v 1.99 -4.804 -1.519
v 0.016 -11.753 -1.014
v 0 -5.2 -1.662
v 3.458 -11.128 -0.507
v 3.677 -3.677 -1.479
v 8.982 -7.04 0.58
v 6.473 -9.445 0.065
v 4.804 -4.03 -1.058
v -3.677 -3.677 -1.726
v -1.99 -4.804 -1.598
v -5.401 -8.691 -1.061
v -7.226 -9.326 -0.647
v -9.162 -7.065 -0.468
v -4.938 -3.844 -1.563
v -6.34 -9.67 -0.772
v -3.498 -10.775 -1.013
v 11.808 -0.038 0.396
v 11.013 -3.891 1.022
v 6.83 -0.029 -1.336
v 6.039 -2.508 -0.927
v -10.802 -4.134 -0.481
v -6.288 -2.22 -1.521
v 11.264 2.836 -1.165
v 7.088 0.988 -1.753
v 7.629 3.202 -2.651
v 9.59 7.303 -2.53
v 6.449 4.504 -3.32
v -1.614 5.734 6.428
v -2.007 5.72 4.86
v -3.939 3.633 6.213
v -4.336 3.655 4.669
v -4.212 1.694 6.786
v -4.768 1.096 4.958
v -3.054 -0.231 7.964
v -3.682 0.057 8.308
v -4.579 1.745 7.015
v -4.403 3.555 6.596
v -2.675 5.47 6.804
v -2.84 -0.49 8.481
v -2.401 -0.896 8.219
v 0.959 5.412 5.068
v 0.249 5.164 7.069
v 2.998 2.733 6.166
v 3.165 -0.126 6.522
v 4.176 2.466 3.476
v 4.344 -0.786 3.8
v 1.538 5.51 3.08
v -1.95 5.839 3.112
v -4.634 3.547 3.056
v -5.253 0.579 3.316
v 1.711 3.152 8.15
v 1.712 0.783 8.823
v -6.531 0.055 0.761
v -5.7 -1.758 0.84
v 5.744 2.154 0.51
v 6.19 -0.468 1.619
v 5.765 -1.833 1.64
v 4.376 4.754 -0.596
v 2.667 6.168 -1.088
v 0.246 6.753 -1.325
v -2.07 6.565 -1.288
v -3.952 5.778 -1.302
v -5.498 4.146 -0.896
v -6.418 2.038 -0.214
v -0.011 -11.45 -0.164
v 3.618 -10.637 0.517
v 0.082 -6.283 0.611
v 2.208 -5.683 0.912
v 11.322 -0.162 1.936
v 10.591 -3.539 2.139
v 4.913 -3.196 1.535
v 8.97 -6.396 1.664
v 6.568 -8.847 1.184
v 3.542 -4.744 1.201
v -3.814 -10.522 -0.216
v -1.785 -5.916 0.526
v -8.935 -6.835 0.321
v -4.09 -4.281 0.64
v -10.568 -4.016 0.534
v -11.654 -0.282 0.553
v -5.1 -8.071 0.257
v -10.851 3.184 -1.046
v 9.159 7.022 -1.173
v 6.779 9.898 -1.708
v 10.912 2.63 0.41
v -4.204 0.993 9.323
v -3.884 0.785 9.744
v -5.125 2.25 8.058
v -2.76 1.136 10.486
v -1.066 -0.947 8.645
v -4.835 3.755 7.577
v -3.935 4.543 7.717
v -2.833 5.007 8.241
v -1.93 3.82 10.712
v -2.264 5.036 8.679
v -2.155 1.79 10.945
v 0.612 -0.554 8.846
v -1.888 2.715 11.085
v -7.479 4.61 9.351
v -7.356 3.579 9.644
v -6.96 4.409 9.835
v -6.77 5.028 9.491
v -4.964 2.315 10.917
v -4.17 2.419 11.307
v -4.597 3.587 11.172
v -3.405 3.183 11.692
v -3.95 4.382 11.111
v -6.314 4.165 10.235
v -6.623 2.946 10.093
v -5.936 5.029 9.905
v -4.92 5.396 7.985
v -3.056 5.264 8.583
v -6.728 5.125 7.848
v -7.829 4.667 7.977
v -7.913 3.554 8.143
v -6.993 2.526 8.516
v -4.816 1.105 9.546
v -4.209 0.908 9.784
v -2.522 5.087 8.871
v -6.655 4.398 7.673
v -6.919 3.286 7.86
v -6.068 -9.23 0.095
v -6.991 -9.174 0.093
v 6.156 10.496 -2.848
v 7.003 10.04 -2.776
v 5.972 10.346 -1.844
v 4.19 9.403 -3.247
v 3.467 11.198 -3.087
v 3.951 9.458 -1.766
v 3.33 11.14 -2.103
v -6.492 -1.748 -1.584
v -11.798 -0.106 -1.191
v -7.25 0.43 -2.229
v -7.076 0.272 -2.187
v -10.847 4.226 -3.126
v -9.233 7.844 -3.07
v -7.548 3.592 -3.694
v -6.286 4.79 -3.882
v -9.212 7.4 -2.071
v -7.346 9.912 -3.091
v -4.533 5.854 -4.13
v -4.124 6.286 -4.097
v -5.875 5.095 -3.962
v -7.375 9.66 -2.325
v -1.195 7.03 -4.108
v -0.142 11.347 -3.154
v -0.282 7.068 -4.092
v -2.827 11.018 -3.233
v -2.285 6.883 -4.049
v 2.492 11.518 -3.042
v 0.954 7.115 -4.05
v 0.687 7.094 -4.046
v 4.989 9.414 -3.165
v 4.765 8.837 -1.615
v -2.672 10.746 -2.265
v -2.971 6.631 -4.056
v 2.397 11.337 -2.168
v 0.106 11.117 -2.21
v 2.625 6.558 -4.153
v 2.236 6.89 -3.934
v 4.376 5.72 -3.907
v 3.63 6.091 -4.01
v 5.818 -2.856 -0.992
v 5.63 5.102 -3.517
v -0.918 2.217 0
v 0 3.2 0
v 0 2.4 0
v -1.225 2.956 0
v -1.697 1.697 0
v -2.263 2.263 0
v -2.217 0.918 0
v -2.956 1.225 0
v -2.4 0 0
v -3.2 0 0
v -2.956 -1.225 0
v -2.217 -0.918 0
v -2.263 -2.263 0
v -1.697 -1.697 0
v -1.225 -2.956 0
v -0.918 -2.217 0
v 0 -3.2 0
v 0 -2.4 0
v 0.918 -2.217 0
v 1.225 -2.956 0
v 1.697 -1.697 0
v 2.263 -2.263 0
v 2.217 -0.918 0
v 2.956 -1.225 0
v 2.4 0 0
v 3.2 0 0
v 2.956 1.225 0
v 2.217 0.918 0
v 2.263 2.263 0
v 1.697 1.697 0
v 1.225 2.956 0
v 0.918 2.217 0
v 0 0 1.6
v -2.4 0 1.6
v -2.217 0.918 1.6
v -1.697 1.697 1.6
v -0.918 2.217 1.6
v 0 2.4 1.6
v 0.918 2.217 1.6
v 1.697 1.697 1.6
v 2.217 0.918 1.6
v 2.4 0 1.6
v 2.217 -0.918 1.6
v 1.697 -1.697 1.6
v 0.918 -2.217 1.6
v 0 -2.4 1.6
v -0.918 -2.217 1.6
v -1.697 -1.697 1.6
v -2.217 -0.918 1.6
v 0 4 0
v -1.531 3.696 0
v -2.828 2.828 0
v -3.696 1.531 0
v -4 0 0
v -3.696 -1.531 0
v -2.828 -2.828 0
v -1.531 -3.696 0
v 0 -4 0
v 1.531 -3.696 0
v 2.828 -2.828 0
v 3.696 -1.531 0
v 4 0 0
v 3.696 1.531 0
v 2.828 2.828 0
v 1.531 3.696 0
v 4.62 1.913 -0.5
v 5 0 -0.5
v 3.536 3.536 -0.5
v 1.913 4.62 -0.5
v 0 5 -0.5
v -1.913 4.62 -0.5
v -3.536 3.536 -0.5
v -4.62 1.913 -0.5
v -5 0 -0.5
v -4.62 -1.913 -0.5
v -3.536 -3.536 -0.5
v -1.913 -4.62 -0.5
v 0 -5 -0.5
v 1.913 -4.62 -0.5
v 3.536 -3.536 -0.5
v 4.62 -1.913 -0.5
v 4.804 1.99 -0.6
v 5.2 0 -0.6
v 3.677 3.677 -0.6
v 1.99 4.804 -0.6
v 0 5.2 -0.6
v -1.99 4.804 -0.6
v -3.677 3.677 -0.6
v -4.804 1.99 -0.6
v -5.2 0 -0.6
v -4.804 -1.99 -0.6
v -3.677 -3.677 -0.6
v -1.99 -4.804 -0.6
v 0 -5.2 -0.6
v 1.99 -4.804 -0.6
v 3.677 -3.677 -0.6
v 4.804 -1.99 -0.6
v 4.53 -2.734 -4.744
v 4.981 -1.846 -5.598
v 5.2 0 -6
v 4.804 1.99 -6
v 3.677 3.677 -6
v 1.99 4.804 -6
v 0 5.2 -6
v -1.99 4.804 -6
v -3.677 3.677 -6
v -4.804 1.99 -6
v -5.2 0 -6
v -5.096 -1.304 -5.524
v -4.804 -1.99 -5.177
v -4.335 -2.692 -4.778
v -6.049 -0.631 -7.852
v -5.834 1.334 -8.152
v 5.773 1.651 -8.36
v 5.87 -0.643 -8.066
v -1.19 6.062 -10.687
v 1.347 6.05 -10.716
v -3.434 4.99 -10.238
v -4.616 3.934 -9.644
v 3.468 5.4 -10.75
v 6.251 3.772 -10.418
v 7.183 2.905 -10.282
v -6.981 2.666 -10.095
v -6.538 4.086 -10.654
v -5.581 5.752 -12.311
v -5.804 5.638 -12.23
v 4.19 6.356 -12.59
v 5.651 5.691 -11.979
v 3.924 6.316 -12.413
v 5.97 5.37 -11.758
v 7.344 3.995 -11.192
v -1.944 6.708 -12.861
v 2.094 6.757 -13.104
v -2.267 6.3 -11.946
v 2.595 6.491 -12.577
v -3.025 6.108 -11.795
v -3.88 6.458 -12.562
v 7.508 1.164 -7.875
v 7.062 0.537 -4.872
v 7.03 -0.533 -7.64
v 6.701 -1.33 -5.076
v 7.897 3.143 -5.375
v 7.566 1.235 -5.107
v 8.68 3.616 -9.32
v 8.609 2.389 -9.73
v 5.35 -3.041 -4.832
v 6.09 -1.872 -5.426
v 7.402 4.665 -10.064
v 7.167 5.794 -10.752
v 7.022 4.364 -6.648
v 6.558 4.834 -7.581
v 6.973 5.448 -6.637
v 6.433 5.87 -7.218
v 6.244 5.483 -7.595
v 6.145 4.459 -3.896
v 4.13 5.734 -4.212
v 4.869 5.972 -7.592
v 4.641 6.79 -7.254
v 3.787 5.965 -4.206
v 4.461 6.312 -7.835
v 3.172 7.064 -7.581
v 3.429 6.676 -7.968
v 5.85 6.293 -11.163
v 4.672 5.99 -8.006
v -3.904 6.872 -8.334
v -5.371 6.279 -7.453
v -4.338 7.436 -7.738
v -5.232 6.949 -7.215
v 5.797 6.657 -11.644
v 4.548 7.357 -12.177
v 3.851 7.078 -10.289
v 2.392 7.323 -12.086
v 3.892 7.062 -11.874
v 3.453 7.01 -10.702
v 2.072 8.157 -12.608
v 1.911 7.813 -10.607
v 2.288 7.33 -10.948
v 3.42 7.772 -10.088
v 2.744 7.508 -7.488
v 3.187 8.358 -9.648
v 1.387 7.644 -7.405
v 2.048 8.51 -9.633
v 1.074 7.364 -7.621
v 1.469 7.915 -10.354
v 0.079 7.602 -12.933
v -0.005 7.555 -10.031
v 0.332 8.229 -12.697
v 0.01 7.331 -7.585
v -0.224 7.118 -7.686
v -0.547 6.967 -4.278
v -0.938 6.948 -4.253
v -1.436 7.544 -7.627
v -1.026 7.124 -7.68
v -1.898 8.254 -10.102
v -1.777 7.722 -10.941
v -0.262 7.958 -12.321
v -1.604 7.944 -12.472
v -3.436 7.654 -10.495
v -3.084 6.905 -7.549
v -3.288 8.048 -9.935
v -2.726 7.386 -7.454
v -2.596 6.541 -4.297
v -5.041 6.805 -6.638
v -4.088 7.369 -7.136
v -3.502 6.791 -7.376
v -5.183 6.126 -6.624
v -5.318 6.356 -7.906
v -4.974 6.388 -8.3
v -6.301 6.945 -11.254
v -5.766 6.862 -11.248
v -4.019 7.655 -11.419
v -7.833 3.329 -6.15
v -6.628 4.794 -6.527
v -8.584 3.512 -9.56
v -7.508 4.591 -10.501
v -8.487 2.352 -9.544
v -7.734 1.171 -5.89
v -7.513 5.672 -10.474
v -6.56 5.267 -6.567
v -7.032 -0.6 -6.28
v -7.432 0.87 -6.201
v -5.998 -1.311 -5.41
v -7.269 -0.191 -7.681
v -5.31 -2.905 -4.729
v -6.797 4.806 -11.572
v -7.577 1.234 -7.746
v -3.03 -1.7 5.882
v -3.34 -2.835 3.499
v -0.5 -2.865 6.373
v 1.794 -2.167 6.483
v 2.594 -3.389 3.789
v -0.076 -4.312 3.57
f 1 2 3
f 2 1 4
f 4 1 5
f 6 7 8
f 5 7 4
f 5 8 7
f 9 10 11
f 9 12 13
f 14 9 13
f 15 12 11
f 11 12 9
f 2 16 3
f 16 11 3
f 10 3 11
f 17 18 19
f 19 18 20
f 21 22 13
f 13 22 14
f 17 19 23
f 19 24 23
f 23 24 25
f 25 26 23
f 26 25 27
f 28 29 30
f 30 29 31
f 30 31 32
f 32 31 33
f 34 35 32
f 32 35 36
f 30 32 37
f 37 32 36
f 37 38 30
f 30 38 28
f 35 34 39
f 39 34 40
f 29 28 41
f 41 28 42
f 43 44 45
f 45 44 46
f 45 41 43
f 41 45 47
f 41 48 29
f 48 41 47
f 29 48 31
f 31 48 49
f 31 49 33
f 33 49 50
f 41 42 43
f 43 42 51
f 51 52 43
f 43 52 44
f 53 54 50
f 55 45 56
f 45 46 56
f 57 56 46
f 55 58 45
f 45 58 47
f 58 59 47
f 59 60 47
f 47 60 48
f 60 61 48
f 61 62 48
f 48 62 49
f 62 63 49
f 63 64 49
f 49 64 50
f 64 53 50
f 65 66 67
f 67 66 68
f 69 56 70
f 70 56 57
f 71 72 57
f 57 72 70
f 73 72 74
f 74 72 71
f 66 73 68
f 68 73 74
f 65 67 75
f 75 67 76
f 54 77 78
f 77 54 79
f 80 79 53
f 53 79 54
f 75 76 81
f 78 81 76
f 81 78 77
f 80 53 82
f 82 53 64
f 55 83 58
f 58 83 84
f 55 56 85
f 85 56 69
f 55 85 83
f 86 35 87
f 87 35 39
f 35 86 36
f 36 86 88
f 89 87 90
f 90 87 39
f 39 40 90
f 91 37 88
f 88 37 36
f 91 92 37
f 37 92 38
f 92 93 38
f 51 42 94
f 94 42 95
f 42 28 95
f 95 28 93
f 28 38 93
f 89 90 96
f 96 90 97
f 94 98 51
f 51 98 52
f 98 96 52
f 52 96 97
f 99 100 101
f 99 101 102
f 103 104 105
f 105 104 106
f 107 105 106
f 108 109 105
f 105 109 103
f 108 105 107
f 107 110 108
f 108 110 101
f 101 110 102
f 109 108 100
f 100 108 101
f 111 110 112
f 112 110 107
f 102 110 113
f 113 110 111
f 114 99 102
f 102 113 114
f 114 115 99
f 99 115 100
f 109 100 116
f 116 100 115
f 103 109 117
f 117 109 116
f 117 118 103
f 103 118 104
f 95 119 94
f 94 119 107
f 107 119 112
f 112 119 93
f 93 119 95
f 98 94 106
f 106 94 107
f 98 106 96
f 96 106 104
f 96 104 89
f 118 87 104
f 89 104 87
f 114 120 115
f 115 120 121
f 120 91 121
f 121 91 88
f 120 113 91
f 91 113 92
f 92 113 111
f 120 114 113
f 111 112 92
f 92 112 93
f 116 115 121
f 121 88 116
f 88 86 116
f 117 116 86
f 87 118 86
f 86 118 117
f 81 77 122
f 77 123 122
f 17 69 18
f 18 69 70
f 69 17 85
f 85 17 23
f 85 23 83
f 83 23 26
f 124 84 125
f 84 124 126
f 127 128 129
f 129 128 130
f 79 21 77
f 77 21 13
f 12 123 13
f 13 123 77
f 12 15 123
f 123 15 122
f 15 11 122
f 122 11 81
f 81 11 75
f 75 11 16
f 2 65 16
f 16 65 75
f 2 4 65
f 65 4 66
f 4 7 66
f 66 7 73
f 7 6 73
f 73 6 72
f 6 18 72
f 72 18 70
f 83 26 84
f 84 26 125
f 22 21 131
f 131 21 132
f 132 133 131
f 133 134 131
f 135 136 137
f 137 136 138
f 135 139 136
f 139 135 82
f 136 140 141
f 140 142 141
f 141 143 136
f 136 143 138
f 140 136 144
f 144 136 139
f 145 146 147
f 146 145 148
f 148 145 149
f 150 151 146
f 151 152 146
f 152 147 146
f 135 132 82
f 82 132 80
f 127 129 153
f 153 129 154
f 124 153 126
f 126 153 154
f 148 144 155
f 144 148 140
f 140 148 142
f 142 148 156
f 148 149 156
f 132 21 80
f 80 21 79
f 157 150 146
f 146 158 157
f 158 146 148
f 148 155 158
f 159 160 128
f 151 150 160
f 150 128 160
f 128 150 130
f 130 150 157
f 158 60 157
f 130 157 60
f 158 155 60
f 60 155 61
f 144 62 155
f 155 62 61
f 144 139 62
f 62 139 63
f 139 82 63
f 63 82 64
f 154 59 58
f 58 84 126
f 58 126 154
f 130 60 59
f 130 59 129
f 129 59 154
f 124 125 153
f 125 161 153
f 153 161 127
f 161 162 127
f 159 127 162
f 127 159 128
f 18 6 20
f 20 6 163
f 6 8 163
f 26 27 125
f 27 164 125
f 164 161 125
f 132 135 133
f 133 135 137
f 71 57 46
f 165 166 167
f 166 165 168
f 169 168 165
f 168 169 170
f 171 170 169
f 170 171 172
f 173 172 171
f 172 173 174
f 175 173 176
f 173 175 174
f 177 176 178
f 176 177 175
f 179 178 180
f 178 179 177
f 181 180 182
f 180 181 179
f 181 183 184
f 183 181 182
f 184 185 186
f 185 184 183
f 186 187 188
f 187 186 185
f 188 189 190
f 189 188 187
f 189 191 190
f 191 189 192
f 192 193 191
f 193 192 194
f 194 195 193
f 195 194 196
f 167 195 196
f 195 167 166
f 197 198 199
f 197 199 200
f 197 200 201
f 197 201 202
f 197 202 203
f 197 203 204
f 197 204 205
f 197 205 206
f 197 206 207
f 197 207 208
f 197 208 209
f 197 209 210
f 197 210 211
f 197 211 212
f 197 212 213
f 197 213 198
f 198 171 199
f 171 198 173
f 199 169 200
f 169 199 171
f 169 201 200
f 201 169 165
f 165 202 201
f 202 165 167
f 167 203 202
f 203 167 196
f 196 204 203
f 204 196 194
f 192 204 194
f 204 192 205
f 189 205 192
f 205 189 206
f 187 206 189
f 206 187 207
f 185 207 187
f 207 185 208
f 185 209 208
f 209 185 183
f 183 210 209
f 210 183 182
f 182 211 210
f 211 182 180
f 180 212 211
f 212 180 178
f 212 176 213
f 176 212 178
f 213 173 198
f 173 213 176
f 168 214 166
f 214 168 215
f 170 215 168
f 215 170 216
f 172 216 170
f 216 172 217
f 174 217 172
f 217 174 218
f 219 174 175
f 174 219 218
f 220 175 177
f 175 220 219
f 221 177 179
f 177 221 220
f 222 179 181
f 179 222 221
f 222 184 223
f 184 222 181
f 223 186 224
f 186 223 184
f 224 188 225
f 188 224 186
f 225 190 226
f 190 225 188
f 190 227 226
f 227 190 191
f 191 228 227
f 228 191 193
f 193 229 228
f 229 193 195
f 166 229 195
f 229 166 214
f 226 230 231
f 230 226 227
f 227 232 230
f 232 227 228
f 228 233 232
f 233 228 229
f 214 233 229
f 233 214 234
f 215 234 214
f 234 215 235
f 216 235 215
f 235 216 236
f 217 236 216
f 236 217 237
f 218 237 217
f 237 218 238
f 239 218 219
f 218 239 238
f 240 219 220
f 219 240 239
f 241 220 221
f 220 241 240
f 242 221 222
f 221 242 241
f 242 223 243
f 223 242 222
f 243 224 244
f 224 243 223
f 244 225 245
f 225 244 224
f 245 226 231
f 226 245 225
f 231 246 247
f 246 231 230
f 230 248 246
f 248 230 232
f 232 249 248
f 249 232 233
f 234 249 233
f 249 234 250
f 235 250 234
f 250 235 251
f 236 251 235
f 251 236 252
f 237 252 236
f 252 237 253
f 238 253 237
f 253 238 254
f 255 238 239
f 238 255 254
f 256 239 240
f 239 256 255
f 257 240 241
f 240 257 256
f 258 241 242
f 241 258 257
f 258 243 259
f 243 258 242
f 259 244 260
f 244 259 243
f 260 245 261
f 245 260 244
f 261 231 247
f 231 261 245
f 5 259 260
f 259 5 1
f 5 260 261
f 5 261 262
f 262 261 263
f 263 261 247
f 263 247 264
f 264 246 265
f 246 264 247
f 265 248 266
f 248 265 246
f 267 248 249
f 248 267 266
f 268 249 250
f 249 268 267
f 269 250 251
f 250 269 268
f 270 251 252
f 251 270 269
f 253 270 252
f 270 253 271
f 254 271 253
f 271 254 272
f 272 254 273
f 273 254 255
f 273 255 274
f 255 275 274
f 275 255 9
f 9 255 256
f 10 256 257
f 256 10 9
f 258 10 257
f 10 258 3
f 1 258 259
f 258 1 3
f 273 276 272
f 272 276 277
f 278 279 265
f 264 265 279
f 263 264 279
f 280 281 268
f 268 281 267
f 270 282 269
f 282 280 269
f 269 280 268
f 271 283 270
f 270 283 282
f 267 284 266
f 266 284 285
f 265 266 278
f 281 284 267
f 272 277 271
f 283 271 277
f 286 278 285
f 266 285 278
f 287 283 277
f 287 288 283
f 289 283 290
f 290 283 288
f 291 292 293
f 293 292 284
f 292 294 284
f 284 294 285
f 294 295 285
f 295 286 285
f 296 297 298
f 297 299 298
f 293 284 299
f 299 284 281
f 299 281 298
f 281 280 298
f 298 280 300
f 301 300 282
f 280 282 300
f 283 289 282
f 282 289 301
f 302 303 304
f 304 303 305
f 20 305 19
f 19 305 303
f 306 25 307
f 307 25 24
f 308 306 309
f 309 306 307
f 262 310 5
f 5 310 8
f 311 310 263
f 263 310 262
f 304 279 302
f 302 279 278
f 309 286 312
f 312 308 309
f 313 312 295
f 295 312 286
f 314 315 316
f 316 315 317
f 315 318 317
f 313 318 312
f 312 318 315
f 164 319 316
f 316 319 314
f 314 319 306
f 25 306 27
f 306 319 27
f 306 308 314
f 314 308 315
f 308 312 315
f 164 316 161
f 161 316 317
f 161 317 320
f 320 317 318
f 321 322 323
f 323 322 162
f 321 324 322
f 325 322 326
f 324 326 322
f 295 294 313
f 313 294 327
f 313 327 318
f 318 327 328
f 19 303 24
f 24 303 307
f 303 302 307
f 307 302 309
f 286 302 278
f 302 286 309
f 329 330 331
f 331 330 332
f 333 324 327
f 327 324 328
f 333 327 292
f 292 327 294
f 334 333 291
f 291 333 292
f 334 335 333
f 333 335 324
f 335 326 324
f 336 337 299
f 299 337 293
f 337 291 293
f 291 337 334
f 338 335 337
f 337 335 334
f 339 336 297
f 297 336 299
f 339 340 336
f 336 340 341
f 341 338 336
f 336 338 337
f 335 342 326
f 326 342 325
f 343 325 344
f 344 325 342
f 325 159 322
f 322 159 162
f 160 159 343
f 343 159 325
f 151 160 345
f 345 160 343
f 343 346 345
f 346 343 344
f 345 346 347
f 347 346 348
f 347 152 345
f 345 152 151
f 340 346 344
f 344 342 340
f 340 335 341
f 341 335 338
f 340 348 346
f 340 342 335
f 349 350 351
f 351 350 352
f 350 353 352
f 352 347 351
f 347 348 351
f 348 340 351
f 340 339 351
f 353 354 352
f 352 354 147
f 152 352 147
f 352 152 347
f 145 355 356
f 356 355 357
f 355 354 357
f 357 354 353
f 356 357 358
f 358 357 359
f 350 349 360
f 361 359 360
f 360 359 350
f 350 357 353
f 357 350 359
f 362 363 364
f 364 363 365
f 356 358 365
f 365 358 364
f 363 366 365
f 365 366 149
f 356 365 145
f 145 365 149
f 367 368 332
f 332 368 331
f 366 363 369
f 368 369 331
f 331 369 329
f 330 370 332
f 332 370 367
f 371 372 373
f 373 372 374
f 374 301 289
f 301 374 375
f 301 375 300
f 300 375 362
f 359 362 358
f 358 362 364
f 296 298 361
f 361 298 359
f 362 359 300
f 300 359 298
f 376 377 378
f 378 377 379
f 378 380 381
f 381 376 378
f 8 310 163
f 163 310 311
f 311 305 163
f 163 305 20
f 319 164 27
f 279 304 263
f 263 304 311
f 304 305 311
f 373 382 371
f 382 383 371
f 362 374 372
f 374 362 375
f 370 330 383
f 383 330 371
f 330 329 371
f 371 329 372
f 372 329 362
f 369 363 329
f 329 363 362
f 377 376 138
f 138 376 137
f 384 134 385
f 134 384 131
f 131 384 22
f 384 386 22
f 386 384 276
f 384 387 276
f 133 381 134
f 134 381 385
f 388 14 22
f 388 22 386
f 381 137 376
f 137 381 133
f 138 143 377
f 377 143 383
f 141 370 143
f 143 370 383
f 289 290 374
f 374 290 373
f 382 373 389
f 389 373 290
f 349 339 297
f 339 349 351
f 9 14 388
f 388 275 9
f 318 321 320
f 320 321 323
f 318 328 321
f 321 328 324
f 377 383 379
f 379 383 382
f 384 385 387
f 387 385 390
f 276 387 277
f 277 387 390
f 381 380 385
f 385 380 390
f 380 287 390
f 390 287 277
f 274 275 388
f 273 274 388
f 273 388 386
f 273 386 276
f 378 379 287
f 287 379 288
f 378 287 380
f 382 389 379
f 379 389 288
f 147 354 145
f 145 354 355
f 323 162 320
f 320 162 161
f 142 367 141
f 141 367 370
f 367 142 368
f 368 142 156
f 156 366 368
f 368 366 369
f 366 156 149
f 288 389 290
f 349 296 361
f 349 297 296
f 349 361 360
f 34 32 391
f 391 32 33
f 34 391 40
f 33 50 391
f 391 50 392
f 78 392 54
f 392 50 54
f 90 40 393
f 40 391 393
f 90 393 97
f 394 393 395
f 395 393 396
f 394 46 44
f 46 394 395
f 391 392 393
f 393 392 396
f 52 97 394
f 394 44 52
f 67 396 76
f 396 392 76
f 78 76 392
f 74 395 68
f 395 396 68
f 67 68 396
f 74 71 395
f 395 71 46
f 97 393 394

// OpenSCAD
use <../lib.scad>
use <s/20606s01.scad>
use <s/20606s02.scad>
use <s/20606s03.scad>
function ldraw_lib__20606() = [
// 0 Minifig Hair Mid-Length Scraggly with Dual Mould Floppy Witch Hat
// 0 Name: 20606.dat
// 0 Author: Lisa Winter [LisaWinter]
// 0 !LDRAW_ORG Part UPDATE 2026-07
// 0 !LICENSE Licensed under CC BY 4.0 : see CAreadme.txt
// 
// 0 BFC CERTIFY CCW
  [0,"BFC","CERTIFY"],
  [0,"BFC","CCW"],
// 
// 0 !CATEGORY Minifig Headwear
// 
// 0 !HISTORY 2016-03-18 {LEGO Digital Designer} Original part shape
// 0 !HISTORY 2024-12-10 [LisaWinter] File preparation for LDraw Parts Tracker
// 0 !HISTORY 2026-07-30 [OrionP] Official Update 2026-07
// 
// 0 // Hat
// 1 16 0 0 0 1 0 0 0 1 0 0 0 1 s\20606s01.dat
  [1,16,0,0,0,1,0,0,0,1,0,0,0,1, ldraw_lib__s__20606s01()],
// 0 // Hair
// 1 16 0 0 0 1 0 0 0 1 0 0 0 1 s\20606s02.dat
  [1,16,0,0,0,1,0,0,0,1,0,0,0,1, ldraw_lib__s__20606s02()],
// 0 // Patternable area
// 1 16 0 0 0 1 0 0 0 1 0 0 0 1 s\20606s03.dat
  [1,16,0,0,0,1,0,0,0,1,0,0,0,1, ldraw_lib__s__20606s03()],
];
module ldraw_lib__20606(step=0, col=false, unit=2/5, alt=false, line=0.2, solid=!$preview)
    makepoly(ldraw_lib__20606(), step=step, col=col, unit=unit, alt=alt, line=line, solid=solid);
ldraw_lib__20606(line=0.2);
